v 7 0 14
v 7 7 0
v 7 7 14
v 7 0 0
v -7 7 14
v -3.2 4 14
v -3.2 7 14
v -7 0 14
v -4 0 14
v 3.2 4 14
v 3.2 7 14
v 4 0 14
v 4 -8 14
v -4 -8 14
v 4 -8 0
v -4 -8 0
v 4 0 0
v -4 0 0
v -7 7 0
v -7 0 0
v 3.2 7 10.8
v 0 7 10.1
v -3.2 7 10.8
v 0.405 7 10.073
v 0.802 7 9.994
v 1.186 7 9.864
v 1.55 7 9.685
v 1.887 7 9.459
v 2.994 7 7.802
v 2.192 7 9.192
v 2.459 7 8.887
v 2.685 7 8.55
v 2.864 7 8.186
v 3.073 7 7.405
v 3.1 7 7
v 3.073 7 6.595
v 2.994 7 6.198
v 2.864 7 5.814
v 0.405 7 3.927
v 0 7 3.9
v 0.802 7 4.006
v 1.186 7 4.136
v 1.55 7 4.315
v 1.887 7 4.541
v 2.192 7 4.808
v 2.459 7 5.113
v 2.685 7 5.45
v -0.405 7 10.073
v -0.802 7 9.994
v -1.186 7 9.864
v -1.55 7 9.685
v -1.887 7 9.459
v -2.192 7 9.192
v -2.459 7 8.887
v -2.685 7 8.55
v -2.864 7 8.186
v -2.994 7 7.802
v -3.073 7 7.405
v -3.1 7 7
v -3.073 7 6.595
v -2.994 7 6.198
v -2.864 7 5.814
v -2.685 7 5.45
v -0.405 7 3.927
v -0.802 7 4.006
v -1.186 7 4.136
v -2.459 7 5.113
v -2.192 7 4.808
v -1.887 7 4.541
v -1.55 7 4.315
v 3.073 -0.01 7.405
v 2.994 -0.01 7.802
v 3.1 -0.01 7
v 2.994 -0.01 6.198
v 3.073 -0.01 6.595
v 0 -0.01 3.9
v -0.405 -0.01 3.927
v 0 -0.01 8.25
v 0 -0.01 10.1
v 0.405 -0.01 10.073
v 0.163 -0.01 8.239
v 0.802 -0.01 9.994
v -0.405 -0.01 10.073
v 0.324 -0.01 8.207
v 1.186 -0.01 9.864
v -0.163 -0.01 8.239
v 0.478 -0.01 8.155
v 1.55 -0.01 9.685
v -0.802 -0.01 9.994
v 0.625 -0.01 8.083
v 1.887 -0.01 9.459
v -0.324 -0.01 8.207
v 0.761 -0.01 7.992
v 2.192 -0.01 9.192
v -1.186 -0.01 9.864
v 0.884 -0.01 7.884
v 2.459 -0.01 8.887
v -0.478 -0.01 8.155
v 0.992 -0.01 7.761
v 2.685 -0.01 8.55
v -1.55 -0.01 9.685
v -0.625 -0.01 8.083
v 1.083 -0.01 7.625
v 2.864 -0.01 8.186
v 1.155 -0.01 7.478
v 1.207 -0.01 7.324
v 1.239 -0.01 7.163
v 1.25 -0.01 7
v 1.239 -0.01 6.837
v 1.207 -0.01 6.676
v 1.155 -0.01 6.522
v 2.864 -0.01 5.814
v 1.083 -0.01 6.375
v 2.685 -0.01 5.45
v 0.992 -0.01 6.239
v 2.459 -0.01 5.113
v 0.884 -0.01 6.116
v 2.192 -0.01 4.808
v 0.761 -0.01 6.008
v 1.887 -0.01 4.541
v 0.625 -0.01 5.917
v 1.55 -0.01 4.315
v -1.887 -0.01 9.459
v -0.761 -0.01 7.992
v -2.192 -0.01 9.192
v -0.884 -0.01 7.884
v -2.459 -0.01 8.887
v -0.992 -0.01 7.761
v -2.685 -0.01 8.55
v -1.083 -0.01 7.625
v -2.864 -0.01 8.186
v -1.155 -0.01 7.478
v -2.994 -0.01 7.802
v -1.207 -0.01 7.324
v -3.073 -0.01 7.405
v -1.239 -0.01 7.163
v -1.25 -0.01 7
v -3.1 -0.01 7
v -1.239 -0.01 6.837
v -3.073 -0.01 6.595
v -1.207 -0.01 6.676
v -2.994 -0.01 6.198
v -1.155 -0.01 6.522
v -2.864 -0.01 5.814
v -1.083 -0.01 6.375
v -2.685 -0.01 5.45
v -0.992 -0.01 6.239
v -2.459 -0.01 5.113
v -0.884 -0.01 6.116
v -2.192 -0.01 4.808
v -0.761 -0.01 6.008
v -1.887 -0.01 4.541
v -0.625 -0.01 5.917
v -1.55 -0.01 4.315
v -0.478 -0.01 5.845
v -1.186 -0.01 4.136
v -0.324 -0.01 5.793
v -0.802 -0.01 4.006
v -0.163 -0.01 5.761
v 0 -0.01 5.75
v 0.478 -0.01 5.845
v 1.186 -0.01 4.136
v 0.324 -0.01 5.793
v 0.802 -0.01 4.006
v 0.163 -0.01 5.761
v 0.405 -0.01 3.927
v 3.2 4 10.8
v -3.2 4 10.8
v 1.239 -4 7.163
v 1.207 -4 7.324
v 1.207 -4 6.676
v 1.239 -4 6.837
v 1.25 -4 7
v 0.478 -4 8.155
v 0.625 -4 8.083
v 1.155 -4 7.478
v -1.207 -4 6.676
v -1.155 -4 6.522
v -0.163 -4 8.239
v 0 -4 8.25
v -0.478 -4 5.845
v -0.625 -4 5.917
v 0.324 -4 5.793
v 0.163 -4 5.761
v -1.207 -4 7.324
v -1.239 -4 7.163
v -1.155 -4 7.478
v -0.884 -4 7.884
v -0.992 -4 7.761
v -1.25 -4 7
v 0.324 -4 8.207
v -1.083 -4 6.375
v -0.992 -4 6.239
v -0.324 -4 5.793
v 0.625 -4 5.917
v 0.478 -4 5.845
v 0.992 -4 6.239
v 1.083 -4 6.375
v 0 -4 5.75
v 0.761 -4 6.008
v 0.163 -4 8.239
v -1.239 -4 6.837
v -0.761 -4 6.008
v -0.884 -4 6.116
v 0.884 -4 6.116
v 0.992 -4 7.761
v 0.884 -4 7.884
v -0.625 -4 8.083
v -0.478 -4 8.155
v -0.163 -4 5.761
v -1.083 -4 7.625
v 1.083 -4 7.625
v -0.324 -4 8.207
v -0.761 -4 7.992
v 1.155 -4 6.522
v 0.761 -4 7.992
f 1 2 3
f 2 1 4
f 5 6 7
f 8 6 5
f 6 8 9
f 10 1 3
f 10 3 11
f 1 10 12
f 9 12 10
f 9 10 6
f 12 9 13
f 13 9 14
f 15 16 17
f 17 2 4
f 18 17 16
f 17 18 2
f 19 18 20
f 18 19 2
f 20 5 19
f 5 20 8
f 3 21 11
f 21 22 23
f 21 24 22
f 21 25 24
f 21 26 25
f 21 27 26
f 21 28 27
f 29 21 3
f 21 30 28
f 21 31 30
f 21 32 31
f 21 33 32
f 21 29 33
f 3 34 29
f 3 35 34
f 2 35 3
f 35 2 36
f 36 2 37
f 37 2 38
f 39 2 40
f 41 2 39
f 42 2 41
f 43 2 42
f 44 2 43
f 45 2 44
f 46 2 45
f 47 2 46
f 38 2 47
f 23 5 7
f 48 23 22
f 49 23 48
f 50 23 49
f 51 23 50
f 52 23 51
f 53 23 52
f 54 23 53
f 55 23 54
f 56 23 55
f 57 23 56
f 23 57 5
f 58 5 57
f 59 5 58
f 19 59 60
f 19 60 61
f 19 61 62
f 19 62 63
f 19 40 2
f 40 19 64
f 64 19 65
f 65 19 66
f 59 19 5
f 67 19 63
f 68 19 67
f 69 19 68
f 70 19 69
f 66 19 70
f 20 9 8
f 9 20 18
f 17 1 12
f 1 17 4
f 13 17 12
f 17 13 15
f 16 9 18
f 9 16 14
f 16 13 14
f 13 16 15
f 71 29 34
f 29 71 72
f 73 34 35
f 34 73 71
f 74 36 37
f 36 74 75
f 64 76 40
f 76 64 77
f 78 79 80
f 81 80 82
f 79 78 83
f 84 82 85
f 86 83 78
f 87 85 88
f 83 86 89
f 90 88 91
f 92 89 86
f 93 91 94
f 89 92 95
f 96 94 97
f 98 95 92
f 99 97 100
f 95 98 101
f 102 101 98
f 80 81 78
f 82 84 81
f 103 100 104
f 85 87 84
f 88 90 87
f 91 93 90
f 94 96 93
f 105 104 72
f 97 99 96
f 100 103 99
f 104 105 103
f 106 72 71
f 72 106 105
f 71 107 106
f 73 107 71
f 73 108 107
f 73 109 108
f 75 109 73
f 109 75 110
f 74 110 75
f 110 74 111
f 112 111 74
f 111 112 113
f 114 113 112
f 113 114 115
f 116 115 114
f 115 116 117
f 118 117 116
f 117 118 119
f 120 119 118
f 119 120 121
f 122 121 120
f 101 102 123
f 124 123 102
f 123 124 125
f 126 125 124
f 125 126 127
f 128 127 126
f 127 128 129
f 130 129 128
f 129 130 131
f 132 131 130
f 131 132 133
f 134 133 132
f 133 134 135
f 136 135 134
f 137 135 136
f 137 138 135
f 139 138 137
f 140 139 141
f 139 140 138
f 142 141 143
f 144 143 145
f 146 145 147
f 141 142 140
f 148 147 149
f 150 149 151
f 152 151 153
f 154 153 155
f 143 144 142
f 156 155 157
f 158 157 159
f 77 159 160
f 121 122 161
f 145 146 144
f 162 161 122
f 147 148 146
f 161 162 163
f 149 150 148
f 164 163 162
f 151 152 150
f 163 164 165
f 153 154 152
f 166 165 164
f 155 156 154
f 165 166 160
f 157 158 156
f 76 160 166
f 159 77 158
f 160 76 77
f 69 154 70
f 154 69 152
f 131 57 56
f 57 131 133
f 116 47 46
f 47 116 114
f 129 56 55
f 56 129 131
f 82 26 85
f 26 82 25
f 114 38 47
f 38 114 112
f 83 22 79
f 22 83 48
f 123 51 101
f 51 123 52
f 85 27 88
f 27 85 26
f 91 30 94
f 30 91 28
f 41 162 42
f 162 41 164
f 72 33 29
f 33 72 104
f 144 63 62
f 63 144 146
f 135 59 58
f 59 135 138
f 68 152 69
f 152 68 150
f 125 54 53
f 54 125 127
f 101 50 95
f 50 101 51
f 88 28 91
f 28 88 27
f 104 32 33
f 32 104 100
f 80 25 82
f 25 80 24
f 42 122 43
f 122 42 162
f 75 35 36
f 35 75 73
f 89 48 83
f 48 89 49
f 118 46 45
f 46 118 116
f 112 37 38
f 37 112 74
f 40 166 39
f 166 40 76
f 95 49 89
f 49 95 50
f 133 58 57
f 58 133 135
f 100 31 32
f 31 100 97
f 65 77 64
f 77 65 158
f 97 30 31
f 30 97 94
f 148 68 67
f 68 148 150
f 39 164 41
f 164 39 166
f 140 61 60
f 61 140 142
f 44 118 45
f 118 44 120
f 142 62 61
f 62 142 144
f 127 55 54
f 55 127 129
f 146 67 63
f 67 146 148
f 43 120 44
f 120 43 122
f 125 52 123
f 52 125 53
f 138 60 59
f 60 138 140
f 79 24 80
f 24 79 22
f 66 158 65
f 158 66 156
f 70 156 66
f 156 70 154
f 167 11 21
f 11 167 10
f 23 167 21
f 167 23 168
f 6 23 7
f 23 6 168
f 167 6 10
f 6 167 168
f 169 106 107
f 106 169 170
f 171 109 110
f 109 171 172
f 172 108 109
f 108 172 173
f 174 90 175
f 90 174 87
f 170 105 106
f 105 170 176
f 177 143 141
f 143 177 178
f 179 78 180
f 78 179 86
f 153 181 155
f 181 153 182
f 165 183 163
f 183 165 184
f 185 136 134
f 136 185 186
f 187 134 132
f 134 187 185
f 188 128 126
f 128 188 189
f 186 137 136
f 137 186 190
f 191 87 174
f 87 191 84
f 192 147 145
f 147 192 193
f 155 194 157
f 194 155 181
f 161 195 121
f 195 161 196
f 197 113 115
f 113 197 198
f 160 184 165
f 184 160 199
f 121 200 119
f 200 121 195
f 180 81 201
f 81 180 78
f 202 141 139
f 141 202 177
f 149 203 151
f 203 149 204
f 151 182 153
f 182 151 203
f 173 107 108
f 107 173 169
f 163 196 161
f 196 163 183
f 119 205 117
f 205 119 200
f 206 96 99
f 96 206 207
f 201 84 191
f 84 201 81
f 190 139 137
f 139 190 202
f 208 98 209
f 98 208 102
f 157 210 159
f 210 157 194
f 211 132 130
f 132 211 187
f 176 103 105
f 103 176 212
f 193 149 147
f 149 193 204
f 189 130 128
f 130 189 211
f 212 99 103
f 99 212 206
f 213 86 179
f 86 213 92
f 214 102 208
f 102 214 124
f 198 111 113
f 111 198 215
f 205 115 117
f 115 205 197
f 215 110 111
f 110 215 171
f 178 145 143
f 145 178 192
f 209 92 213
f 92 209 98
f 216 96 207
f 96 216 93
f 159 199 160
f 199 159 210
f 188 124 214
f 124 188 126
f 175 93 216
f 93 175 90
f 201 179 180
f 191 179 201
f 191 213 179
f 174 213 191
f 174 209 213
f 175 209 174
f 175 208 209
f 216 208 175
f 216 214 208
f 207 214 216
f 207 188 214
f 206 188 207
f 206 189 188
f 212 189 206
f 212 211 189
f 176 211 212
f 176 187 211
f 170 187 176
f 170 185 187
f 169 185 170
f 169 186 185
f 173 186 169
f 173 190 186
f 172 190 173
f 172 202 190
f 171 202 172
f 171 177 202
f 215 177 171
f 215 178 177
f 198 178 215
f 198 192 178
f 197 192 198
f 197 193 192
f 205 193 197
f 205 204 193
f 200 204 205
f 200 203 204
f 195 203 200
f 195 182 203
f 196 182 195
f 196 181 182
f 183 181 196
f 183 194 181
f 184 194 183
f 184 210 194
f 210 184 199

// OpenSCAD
// ============================================================
// Miscellaneous Small Parts
// ============================================================
// PART variable selects which part to render:
//
//   "tube_clip"   — silicone tubing saddle clip (×12 per build)
//   "manifold"    — 3-way water manifold (1-to-3 drip splitter)
//   "drip_emit"   — drip emitter cap (×3 per build)
//   "led_panel"   — status LED mounting panel (×1, for top cap)
//   "pump_mnt"    — peristaltic pump base bracket
//   "all"         — render all parts exploded (for preview only)
//
// All parts fit on a 200×200mm print bed.
// Material: PETG.  Infill: 50–60% (functional load-bearing parts).
// ============================================================

include <params.scad>

PART = "tube_clip";  // Override: openscad -D 'PART="manifold"' ...

// ============================================================
// MODULE: tube saddle clip (tube_clip.stl)
// ============================================================
// Clips around 6mm OD silicone tubing, screws to enclosure wall.
// Used every ~50mm along tubing runs inside the column.
// Print orientation: flat (base on bed). ~20×20mm footprint.
// ============================================================
module tube_clip() {
    body_h = tube_od + clip_body_t * 2;   // Total height around tube
    body_d = clip_body_t + tube_od/2;     // Depth (half-pipe clip)

    difference() {
        union() {
            // Clip body (U-channel around tube)
            translate([-clip_body_w/2, 0, 0])
                cube([clip_body_w, body_d, body_h]);

            // Mounting tab (flat tab with screw hole)
            translate([-clip_tab_w/2, -clip_tab_h, 0])
                cube([clip_tab_w, clip_tab_h + body_d, body_h]);
        }

        // Tube bore (half-round channel)
        translate([0, clip_body_t + tube_od/2, body_h/2])
            rotate([90, 0, 0])
                cylinder(d=tube_od + tol, h=body_d + eps);

        // Clip opening slot at top (allows tube to snap in)
        translate([-tube_od/2 - tol, clip_body_t, body_h - tube_od/2 - tol])
            cube([tube_od + 2*tol, body_d + eps, tube_od/2 + tol + eps]);

        // Mounting screw hole (self-tap M2.5)
        translate([0, -clip_tab_h/2, body_h/2])
            rotate([-90, 0, 0])
                cylinder(d=clip_screw_d, h=clip_tab_h + body_d + eps);
    }
}

// ============================================================
// MODULE: 3-way water manifold (manifold_3way.stl)
// ============================================================
// 1 inlet (for 6mm ID pump tubing) → 3 outlets (for 4mm ID drip tubing).
// Press-fit barbed connections; 60% infill for pressure resistance.
// Print orientation: flat. Footprint ~60×30mm.
// Post-process: test with water pressure before installation.
// ============================================================
module manifold_3way() {
    body_len  = mani_barb_l * 2 + mani_body_d;
    inlet_len = mani_barb_l + 6;

    // Centre body
    cylinder(d=mani_body_d, h=mani_body_d);

    // Inlet barb (pointing up = +Z direction in print orientation)
    translate([0, 0, mani_body_d]) {
        // Barb shaft
        cylinder(d=mani_in_d, h=inlet_len);
        // Retention ridge
        translate([0, 0, inlet_len - 6])
            cylinder(d1=mani_in_d, d2=mani_in_d + 2*mani_barb_step, h=3);
        translate([0, 0, inlet_len - 3])
            cylinder(d1=mani_in_d + 2*mani_barb_step, d2=mani_in_d, h=3);
    }

    // 3 outlet barbs (radiating at 120° in XY plane)
    for (a = [0, 120, 240]) {
        rotate([0, 0, a])
            translate([mani_body_d/2, 0, mani_body_d/2])
                rotate([0, 90, 0]) {
                    // Barb shaft
                    cylinder(d=mani_out_d, h=mani_barb_l);
                    // Retention ridge
                    translate([0, 0, mani_barb_l - 5])
                        cylinder(d1=mani_out_d,
                                 d2=mani_out_d + 2*mani_barb_step, h=2.5);
                    translate([0, 0, mani_barb_l - 2.5])
                        cylinder(d1=mani_out_d + 2*mani_barb_step,
                                 d2=mani_out_d, h=2.5);
                }
    }

    // Bore: inlet channel to body
    translate([0, 0, -eps])
        cylinder(d=mani_in_d - 2, h=mani_body_d + inlet_len + 2*eps);

    // Bore: 3 outlet channels
    difference() {
        // (placeholder — use difference at call site if needed)
        translate([0, 0, 0]) cylinder(d=0.01, h=0.01); // noop
    }
}

// Manifold with bores (final part)
module manifold_3way_final() {
    difference() {
        manifold_3way();

        // Inlet bore (through inlet barb and body)
        translate([0, 0, -eps])
            cylinder(d=mani_in_d - 2.5, h=mani_body_d * 2);

        // Outlet bores
        for (a = [0, 120, 240])
            rotate([0, 0, a])
                translate([mani_body_d/2 - eps, 0, mani_body_d/2])
                    rotate([0, 90, 0])
                        cylinder(d=mani_out_d - 2.5, h=mani_barb_l + 2*eps);
    }
}

// ============================================================
// MODULE: drip emitter (drip_emitter.stl ×3)
// ============================================================
// Press-fits onto end of 6mm OD drip tubing.
// 2mm orifice delivers controlled drip flow onto coir surface.
// Print orientation: upright (Z = long axis). ~10×10mm footprint.
// ============================================================
module drip_emitter() {
    difference() {
        union() {
            // Body cylinder
            cylinder(d=emit_od, h=emit_len);
            // Barb for tubing retention (near open end)
            translate([0, 0, emit_len - 6])
                cylinder(d1=emit_od, d2=emit_od + 2, h=3);
            translate([0, 0, emit_len - 3])
                cylinder(d1=emit_od + 2, d2=emit_od, h=3);
        }

        // Internal bore (tapers to orifice)
        translate([0, 0, -eps])
            cylinder(d=emit_barb_d, h=4 + eps);         // open end (tube insert)
        translate([0, 0, 4])
            cylinder(d1=emit_barb_d, d2=emit_orifice,    // taper
                     h=emit_len - 4 - eps);
        translate([0, 0, emit_len - 2])
            cylinder(d=emit_orifice, h=2 + eps);         // orifice exit
    }
}

// ============================================================
// MODULE: status LED panel (led_panel.stl)
// ============================================================
// Thin panel with 4× 3mm LED holes, mounts in top cap front wall.
// Replaces manual hole-making for LED placement.
// Print orientation: flat. 50×12mm footprint.
// ============================================================
module led_panel_mount() {
    difference() {
        // Panel body
        cube([led_pan_w, led_pan_t, led_pan_h]);

        // 4× LED holes (centred vertically)
        for (i = [0:status_n-1])
            translate([led_pan_w/2 - (status_n-1)*led_spacing/2 + i*led_spacing,
                       -eps,
                       led_pan_h/2])
                rotate([-90, 0, 0])
                    cylinder(d=status_d, h=led_pan_t + 2*eps);

        // 2× M2 mounting holes at panel ends
        for (mx = [3, led_pan_w - 3])
            translate([mx, -eps, led_pan_h/2])
                rotate([-90, 0, 0])
                    cylinder(d=2.2, h=led_pan_t + 2*eps);
    }
}

// ============================================================
// RENDER SELECTION
// ============================================================
if (PART == "tube_clip") {
    tube_clip();

} else if (PART == "manifold") {
    manifold_3way_final();

} else if (PART == "drip_emit") {
    drip_emitter();

} else if (PART == "led_panel") {
    led_panel_mount();

} else if (PART == "all") {
    // Exploded preview of all misc parts
    tube_clip();
    translate([30, 0, 0]) manifold_3way_final();
    translate([80, 0, 0]) drip_emitter();
    translate([110, 0, 0]) led_panel_mount();

} else {
    tube_clip();
}
